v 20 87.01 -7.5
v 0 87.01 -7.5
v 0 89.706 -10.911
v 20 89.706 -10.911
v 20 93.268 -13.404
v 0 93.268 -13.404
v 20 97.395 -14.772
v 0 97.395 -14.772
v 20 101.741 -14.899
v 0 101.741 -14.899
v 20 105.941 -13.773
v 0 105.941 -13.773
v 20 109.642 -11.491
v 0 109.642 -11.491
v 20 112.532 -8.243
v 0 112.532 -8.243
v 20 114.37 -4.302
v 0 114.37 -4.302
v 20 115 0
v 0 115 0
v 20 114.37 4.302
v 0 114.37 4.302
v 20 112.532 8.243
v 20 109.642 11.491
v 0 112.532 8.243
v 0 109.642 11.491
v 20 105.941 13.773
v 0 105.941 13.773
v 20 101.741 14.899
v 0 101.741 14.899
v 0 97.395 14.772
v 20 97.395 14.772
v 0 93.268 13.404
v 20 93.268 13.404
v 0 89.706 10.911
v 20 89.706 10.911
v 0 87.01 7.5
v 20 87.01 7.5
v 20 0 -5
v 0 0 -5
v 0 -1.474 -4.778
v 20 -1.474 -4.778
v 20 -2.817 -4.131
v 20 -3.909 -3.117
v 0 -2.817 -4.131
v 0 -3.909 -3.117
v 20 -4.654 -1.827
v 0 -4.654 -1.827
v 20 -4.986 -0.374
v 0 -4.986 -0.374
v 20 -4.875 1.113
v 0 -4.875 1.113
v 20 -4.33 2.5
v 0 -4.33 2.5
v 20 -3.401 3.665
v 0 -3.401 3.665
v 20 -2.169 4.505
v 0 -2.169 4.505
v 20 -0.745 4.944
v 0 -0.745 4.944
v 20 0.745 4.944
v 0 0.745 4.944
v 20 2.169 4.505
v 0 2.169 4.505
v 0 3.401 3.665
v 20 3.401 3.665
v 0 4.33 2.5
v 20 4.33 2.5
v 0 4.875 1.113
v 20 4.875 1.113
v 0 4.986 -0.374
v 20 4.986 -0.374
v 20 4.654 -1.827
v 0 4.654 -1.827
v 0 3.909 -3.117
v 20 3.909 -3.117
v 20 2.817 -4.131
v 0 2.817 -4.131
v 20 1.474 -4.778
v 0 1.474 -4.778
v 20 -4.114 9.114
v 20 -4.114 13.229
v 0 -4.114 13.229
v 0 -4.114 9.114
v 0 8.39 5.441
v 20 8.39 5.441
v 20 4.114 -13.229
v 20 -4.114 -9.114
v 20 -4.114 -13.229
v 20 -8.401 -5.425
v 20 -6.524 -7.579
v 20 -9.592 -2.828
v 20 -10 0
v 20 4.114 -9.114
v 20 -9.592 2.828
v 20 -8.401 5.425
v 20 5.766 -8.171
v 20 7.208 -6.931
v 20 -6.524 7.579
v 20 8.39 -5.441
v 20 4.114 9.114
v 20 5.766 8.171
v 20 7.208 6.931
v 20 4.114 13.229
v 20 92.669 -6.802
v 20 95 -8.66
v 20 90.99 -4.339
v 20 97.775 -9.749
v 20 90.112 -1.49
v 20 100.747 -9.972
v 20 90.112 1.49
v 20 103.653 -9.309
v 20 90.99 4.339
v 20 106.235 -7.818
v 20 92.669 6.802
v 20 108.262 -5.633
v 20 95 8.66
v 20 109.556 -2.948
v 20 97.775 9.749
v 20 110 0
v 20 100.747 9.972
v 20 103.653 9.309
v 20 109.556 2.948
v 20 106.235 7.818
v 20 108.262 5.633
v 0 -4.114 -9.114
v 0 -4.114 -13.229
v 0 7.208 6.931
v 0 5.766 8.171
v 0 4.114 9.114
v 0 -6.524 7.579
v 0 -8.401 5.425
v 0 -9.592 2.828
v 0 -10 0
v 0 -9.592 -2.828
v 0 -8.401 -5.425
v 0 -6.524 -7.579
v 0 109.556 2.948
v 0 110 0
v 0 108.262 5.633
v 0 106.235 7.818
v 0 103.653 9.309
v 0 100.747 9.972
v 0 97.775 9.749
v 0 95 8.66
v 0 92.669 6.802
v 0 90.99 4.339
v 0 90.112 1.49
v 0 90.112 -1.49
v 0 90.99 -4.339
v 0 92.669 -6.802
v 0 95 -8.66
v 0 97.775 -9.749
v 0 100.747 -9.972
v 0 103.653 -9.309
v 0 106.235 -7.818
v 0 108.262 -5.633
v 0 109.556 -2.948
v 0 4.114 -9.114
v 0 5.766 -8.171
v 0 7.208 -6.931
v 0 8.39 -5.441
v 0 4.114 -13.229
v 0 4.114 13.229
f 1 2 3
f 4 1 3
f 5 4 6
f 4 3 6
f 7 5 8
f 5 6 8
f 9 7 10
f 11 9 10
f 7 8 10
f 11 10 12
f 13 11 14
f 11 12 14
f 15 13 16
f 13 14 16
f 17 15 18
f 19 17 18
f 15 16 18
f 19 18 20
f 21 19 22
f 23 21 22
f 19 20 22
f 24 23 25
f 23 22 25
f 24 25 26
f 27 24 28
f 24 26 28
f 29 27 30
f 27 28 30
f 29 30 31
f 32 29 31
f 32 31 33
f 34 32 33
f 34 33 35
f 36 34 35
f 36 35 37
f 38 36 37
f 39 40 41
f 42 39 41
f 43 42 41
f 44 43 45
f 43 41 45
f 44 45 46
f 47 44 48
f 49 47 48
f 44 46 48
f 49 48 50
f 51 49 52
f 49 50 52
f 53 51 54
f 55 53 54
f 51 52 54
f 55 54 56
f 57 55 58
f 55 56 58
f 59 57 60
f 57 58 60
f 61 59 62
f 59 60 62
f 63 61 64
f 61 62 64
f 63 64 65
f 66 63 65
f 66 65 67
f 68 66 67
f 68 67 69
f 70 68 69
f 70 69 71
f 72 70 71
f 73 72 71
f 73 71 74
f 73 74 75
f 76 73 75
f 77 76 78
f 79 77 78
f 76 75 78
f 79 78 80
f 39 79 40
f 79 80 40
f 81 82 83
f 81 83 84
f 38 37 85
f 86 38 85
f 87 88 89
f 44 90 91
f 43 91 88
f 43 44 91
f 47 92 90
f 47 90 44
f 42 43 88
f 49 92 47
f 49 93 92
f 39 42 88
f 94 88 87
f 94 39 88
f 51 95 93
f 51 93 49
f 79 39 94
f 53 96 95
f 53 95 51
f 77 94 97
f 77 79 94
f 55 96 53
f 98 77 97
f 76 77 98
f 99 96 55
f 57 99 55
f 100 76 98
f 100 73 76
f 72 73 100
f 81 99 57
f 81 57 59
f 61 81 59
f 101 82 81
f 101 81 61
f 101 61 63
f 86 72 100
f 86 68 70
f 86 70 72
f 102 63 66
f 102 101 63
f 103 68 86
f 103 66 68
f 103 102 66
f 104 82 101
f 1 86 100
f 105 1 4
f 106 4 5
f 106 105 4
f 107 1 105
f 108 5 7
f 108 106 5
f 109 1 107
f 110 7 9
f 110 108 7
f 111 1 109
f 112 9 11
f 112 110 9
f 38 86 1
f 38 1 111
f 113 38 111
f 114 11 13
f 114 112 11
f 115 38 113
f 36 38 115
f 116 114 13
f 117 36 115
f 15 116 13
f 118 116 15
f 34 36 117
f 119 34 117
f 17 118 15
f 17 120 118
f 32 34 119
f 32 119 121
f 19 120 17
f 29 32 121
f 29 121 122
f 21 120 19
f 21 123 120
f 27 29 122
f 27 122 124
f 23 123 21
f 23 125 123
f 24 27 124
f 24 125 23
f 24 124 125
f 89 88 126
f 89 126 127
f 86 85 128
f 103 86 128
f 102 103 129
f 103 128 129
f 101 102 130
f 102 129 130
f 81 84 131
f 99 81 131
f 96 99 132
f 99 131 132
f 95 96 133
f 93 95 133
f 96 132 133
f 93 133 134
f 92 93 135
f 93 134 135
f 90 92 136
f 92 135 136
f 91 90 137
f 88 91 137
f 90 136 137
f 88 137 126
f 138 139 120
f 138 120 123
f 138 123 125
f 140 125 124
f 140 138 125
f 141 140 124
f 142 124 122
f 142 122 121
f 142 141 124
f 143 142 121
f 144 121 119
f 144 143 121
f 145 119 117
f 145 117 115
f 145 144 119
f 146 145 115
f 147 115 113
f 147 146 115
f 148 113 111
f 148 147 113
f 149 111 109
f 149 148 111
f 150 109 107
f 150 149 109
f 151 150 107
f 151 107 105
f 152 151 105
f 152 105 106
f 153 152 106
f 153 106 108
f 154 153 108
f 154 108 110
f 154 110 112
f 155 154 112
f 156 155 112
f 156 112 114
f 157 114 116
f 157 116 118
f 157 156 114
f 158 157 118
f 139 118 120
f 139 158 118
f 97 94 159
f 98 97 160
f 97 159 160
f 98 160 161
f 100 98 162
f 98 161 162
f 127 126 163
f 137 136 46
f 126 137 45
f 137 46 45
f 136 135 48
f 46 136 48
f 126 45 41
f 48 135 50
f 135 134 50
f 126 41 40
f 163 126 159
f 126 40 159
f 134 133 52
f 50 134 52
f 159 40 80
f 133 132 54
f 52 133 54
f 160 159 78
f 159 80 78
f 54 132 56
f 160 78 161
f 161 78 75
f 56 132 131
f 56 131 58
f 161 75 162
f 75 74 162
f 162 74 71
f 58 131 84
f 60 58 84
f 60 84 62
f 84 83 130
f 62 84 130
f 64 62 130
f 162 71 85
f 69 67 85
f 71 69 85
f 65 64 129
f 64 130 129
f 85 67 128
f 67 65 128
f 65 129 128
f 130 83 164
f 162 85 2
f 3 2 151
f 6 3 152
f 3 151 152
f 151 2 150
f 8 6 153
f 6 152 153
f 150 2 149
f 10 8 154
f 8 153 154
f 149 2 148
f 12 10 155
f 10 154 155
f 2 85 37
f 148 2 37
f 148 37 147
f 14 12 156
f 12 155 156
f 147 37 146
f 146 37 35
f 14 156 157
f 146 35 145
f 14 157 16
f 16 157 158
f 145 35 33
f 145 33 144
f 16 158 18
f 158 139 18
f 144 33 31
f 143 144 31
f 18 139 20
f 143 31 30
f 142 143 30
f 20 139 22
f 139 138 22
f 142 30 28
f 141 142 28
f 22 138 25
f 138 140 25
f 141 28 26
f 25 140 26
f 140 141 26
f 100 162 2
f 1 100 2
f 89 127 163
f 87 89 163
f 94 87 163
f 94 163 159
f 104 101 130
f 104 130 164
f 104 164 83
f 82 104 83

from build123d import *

# Parameters (mm, degrees)
F0_R     = 10
F1_DEPTH = 20


with BuildPart() as f1:
    # F0 (on Right) → F1 (new body)
    with BuildSketch(Plane.YZ):
        with BuildLine():
            Line((0, 13.228757), (0, 5))
            ThreePointArc((0, 5), (5, 0), (0, -5))
            Line((0, -5), (0, -13.228757))
            Line((0, -13.228757), (4.114378, -13.228757))
            Line((4.114378, -13.228757), (4.114378, -9.114378))
            ThreePointArc((4.114378, -9.114378), (6.516361, -7.585317), (8.390026, -5.441274))
            Line((8.390026, -5.441274), (87.009619, -7.5))
            ThreePointArc((87.009619, -7.5), (115, 0), (87.009619, 7.5))
            Line((87.009619, 7.5), (8.390026, 5.441274))
            ThreePointArc((8.390026, 5.441274), (6.516361, 7.585317), (4.114378, 9.114378))
            Line((4.114378, 9.114378), (4.114378, 13.228757))
            Line((4.114378, 13.228757), (0, 13.228757))
        make_face()
        with Locations((100, 0)):
            Circle(F0_R, mode=Mode.SUBTRACT)
        with BuildLine():
            ThreePointArc((0, -5), (-5, 0), (0, 5))
            Line((0, 5), (0, 13.228757))
            Line((0, 13.228757), (-4.114378, 13.228757))
            Line((-4.114378, 13.228757), (-4.114378, 9.114378))
            ThreePointArc((-4.114378, 9.114378), (-10, 0), (-4.114378, -9.114378))
            Line((-4.114378, -9.114378), (-4.114378, -13.228757))
            Line((-4.114378, -13.228757), (0, -13.228757))
            Line((0, -13.228757), (0, -5))
        make_face()
    extrude(amount=F1_DEPTH)


solid = f1.part
